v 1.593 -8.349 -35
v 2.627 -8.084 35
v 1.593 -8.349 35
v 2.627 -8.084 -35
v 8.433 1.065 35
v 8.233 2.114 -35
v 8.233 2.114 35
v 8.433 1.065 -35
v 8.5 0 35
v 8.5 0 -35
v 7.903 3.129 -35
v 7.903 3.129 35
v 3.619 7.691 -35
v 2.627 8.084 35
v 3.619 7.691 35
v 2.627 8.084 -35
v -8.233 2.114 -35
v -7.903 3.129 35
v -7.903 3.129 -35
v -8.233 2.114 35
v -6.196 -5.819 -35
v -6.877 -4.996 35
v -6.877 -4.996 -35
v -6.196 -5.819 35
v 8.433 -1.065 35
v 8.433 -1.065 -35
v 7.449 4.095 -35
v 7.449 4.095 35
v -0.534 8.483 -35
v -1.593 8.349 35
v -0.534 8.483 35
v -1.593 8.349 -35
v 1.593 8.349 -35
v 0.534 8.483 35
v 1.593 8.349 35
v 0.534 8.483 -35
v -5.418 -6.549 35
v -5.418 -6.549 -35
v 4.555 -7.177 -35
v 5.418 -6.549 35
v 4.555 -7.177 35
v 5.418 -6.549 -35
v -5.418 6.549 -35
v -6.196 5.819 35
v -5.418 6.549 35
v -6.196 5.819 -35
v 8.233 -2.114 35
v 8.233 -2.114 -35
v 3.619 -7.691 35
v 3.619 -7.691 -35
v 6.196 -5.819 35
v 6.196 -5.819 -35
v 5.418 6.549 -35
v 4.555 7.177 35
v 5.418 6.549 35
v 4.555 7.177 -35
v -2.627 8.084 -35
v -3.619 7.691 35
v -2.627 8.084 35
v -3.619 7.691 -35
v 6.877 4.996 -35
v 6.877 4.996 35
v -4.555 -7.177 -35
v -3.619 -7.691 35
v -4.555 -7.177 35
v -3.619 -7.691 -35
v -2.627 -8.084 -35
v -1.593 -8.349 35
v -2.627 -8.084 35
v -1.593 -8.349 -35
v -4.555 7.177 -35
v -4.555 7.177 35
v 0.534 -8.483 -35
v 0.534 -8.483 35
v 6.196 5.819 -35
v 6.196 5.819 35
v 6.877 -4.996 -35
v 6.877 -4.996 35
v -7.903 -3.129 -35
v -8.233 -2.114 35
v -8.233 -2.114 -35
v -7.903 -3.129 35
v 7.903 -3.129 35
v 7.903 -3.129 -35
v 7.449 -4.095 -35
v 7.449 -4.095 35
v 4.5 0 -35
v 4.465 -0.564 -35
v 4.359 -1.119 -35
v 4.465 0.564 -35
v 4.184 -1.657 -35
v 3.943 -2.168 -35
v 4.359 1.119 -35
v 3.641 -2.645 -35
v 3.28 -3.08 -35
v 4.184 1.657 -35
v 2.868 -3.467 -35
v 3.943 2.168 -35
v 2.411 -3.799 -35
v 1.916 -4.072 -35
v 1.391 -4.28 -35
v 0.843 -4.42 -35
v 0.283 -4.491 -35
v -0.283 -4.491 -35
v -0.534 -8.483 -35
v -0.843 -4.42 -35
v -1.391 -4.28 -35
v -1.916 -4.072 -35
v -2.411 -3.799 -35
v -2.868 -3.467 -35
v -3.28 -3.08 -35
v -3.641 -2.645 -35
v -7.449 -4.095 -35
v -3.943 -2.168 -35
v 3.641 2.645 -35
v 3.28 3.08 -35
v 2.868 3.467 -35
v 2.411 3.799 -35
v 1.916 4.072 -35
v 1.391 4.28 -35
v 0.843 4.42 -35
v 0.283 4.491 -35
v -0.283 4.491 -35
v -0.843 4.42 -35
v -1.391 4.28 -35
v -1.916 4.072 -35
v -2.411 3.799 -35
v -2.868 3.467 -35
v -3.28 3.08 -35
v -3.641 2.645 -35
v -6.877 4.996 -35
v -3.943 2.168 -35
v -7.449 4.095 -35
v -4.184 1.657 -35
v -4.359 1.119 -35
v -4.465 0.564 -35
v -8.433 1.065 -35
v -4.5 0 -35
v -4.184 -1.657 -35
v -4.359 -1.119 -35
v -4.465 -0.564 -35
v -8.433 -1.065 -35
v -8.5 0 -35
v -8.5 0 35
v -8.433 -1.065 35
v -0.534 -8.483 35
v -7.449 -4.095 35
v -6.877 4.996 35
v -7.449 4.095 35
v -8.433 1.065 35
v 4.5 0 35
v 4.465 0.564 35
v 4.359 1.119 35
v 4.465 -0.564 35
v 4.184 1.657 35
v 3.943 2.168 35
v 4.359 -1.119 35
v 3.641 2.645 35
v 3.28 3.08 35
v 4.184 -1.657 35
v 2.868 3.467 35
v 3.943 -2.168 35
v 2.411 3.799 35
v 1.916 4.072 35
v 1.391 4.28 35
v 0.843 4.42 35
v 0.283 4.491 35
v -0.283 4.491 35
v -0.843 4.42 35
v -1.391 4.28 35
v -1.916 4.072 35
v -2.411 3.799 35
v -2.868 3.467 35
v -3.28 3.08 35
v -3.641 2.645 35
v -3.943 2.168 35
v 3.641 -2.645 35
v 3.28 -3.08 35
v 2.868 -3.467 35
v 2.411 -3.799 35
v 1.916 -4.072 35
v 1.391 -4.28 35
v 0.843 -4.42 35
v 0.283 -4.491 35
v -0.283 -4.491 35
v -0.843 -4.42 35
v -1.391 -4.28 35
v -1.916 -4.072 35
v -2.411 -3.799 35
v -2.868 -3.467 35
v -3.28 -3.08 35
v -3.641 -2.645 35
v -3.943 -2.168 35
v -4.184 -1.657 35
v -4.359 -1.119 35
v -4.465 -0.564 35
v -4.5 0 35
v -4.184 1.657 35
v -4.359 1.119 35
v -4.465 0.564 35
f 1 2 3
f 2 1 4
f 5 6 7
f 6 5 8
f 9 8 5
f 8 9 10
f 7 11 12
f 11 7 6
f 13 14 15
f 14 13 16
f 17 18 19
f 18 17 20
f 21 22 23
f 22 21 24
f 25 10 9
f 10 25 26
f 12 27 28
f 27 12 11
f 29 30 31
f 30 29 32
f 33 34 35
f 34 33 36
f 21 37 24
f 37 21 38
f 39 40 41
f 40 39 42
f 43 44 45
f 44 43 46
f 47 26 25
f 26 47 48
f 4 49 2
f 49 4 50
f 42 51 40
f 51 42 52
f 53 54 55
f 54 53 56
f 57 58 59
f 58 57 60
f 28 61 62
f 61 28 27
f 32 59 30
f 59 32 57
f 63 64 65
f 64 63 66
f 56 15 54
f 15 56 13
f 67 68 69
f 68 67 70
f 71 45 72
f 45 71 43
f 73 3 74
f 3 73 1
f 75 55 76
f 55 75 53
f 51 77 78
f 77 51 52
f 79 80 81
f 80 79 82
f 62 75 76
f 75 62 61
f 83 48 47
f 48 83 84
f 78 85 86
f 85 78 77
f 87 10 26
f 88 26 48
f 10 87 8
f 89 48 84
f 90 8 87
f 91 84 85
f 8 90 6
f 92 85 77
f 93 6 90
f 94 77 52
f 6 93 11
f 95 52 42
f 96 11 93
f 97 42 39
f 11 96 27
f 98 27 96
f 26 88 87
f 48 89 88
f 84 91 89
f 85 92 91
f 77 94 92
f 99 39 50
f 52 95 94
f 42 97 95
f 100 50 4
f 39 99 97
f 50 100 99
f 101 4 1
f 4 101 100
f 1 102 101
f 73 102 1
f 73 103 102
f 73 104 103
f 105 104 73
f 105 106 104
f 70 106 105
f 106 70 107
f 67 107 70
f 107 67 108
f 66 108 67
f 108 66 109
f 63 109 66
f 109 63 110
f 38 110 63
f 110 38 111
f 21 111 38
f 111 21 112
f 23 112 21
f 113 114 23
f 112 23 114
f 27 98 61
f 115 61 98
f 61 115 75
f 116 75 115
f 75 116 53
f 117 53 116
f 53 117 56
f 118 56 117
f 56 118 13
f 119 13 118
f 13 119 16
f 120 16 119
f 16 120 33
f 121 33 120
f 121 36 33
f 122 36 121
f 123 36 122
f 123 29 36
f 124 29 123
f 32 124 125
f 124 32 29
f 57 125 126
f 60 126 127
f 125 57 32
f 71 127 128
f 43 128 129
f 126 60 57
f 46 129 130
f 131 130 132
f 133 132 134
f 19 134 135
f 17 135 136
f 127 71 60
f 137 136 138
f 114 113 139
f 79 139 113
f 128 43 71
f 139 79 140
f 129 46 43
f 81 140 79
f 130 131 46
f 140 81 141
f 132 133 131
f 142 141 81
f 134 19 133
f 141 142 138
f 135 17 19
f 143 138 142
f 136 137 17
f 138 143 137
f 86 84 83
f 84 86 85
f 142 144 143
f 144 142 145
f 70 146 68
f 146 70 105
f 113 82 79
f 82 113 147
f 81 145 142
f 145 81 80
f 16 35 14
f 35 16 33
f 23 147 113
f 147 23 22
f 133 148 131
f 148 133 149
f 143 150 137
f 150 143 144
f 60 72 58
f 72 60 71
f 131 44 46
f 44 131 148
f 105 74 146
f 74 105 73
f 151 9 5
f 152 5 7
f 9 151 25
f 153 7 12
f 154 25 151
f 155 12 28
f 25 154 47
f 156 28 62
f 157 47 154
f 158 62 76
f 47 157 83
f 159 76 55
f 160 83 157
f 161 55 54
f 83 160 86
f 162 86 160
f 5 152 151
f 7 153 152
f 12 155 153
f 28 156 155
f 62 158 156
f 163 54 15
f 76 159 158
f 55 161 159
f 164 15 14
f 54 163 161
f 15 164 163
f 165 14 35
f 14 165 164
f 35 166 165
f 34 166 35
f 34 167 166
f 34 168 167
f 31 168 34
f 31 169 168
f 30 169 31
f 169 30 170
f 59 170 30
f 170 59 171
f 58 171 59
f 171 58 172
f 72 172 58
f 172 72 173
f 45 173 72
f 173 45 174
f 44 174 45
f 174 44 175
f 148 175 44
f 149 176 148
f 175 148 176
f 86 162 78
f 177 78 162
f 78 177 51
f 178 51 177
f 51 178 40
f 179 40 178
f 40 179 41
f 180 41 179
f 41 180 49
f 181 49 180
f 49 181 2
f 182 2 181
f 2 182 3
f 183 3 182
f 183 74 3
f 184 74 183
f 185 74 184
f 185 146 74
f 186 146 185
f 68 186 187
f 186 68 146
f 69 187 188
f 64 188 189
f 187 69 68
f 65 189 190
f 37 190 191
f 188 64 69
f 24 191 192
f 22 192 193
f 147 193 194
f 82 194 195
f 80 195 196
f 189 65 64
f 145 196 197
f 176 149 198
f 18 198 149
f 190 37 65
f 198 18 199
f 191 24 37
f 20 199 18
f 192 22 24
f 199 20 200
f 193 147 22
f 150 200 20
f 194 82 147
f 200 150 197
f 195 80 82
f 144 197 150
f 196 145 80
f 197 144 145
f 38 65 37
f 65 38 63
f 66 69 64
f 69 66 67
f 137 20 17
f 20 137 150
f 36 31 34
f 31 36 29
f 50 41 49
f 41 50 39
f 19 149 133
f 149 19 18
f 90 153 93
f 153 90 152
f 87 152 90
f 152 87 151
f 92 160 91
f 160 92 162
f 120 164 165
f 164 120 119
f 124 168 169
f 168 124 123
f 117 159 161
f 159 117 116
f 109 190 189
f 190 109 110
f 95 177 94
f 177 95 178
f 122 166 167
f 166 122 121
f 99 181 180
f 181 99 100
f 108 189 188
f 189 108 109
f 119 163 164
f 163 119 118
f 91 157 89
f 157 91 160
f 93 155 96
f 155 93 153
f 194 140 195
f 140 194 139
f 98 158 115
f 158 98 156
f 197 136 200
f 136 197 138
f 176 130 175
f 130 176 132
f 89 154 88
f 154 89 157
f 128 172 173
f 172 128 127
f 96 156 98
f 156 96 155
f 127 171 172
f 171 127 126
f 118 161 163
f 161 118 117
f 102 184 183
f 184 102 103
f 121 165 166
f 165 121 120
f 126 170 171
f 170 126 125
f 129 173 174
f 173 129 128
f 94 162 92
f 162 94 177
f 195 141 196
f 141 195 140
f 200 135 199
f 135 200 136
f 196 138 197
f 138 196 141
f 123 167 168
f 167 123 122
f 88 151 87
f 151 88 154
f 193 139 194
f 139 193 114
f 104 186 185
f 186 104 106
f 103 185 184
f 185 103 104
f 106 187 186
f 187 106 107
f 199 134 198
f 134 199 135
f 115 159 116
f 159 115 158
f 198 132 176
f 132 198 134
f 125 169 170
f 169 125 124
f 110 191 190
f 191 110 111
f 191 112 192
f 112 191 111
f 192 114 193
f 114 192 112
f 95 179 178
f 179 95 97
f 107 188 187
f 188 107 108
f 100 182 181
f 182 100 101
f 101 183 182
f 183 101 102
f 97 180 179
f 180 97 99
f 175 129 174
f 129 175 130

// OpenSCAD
$fn = 50;


difference() {
	union() {
		translate(v = [0, 0, -35.0000000000]) {
			cylinder(h = 70, r = 8.5000000000);
		}
	}
	union() {
		translate(v = [0, 0, -100.0000000000]) {
			cylinder(h = 200, r = 4.5000000000);
		}
	}
}
